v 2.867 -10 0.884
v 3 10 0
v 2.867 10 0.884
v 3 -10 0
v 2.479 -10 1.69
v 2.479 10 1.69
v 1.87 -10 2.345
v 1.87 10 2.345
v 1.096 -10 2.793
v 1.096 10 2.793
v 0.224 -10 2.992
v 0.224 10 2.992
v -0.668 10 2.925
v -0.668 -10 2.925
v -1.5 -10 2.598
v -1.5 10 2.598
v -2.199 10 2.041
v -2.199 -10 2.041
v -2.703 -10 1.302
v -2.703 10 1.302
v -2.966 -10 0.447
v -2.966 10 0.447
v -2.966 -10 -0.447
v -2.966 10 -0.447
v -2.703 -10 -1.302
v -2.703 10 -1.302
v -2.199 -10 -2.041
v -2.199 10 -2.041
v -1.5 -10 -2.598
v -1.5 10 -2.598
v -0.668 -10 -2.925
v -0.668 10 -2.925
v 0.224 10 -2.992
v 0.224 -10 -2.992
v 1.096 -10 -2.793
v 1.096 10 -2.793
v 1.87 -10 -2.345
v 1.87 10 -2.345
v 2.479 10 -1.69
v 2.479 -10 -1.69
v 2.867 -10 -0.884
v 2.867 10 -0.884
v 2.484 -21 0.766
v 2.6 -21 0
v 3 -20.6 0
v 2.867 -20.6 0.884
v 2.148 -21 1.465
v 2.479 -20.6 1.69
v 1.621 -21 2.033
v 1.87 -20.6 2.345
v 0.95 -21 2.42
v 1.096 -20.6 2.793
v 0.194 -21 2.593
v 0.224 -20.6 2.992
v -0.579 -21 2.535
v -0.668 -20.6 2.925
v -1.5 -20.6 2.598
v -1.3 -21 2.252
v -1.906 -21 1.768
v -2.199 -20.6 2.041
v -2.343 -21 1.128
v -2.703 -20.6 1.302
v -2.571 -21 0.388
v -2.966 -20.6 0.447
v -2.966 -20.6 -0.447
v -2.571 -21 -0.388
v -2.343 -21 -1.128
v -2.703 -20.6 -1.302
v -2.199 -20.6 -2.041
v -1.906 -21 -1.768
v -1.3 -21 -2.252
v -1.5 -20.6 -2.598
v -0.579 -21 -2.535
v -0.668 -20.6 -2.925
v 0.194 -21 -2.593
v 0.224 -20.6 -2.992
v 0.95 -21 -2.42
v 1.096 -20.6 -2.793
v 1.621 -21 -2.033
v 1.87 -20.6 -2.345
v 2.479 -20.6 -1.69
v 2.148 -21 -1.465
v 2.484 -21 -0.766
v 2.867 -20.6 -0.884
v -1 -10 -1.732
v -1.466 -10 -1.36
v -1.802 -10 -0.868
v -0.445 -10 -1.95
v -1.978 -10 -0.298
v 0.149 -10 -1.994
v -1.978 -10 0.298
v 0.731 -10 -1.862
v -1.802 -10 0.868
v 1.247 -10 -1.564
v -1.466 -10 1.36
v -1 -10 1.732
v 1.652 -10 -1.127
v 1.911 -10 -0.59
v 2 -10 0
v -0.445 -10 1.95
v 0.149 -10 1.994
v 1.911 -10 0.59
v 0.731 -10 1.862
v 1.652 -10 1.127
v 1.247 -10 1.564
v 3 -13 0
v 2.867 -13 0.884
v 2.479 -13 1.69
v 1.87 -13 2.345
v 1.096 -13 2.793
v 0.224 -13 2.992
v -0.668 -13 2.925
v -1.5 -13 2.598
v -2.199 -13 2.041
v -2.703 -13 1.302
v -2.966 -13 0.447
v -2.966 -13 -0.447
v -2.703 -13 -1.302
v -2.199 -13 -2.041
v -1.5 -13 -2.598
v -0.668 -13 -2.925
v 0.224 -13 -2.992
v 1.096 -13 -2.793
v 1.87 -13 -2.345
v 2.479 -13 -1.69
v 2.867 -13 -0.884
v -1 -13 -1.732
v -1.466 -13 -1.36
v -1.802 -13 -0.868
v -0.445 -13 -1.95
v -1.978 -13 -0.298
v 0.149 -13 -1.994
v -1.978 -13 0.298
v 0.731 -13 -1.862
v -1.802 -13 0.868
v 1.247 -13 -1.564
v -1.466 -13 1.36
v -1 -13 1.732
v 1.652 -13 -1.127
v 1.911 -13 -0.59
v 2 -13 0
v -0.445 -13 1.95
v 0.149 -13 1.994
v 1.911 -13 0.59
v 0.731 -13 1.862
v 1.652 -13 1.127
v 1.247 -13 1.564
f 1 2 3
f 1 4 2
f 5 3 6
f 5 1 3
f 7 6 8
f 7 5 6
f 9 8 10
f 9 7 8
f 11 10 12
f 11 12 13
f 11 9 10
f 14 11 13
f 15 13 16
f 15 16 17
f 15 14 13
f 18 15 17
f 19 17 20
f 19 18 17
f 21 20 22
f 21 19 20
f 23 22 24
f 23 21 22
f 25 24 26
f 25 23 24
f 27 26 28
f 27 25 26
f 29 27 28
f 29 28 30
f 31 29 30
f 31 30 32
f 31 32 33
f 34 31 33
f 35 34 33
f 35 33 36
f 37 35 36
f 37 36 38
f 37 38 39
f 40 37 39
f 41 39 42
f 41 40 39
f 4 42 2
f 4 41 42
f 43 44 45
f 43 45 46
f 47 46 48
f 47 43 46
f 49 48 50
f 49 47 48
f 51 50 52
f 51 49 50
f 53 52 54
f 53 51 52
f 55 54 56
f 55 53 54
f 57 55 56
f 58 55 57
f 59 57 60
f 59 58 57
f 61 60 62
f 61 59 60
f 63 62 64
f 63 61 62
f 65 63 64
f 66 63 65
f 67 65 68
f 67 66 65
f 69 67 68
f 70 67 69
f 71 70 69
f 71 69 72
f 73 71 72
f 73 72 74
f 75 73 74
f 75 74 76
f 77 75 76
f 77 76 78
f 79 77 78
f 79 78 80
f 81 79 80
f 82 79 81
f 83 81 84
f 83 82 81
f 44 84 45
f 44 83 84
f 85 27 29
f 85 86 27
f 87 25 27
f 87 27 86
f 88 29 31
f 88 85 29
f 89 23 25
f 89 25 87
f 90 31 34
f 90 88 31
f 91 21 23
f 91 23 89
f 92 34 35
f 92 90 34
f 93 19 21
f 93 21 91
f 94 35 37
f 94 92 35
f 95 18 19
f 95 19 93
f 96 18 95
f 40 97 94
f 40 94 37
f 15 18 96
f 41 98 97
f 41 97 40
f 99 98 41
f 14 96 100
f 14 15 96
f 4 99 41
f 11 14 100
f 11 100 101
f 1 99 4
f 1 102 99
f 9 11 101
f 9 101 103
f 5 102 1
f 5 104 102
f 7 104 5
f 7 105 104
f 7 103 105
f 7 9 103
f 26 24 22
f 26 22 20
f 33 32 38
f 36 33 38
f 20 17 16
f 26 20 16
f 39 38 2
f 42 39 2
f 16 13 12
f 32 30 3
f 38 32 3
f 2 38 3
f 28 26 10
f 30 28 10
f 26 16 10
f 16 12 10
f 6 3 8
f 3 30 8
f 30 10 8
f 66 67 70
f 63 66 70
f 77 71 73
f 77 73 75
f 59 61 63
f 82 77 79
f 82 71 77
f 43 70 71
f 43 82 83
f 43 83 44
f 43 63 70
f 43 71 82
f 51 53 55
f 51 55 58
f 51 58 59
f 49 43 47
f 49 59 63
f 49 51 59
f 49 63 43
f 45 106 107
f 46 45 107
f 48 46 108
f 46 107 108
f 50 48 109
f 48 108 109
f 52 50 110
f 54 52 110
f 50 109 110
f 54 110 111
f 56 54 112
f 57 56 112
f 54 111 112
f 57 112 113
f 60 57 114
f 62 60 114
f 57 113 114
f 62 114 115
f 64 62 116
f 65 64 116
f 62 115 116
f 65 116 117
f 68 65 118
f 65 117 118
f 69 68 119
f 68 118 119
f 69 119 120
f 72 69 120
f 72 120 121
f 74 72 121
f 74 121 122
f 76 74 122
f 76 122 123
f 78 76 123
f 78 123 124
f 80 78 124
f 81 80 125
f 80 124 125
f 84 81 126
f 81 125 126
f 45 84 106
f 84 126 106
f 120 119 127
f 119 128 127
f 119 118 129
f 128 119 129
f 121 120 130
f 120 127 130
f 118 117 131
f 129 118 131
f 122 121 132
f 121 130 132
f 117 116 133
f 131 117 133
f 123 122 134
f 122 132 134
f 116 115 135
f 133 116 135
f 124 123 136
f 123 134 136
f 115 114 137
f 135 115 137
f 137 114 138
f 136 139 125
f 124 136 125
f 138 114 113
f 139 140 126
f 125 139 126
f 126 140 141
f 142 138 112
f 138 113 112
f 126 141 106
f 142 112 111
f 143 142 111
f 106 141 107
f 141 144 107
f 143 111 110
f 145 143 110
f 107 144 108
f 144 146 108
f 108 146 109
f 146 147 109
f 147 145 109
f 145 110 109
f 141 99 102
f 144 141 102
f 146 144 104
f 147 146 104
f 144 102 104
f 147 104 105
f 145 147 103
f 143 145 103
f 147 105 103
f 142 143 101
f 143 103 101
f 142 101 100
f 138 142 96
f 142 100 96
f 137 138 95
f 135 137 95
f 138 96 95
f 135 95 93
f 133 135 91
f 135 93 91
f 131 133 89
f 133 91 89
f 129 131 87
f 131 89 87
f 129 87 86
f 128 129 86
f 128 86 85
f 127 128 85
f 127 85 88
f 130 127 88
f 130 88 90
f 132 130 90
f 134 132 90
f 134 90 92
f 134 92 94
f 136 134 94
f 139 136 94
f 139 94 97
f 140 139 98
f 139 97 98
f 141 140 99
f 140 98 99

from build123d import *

# Parameters (mm, degrees)
F0_R     = 3
F1_DEPTH = 10
F2_R     = 2
F3_DEPTH = 3
F4_R     = 3
F5_DEPTH = 8
F6_SIZE  = 0.4


with BuildPart() as f1:
    # F0 (on Front) → F1 (new body, symmetric)
    with BuildSketch(Plane.XZ):
        Circle(F0_R)
    extrude(amount=F1_DEPTH, both=True)

    # F2 (on face) → F3 (join)
    with BuildSketch(Plane.XZ.offset(10)):
        Circle(F2_R)
    extrude(amount=F3_DEPTH)

    # F4 (on face) → F5 (join)
    with BuildSketch(Plane.XZ.offset(13)):
        Circle(F4_R)
    extrude(amount=F5_DEPTH)

    # F6
    f6_edges = [f1.edges().sort_by_distance(p)[0] for p in [
        (-3, -21, 0),
    ]]
    chamfer(f6_edges, length=F6_SIZE)


solid = f1.part
